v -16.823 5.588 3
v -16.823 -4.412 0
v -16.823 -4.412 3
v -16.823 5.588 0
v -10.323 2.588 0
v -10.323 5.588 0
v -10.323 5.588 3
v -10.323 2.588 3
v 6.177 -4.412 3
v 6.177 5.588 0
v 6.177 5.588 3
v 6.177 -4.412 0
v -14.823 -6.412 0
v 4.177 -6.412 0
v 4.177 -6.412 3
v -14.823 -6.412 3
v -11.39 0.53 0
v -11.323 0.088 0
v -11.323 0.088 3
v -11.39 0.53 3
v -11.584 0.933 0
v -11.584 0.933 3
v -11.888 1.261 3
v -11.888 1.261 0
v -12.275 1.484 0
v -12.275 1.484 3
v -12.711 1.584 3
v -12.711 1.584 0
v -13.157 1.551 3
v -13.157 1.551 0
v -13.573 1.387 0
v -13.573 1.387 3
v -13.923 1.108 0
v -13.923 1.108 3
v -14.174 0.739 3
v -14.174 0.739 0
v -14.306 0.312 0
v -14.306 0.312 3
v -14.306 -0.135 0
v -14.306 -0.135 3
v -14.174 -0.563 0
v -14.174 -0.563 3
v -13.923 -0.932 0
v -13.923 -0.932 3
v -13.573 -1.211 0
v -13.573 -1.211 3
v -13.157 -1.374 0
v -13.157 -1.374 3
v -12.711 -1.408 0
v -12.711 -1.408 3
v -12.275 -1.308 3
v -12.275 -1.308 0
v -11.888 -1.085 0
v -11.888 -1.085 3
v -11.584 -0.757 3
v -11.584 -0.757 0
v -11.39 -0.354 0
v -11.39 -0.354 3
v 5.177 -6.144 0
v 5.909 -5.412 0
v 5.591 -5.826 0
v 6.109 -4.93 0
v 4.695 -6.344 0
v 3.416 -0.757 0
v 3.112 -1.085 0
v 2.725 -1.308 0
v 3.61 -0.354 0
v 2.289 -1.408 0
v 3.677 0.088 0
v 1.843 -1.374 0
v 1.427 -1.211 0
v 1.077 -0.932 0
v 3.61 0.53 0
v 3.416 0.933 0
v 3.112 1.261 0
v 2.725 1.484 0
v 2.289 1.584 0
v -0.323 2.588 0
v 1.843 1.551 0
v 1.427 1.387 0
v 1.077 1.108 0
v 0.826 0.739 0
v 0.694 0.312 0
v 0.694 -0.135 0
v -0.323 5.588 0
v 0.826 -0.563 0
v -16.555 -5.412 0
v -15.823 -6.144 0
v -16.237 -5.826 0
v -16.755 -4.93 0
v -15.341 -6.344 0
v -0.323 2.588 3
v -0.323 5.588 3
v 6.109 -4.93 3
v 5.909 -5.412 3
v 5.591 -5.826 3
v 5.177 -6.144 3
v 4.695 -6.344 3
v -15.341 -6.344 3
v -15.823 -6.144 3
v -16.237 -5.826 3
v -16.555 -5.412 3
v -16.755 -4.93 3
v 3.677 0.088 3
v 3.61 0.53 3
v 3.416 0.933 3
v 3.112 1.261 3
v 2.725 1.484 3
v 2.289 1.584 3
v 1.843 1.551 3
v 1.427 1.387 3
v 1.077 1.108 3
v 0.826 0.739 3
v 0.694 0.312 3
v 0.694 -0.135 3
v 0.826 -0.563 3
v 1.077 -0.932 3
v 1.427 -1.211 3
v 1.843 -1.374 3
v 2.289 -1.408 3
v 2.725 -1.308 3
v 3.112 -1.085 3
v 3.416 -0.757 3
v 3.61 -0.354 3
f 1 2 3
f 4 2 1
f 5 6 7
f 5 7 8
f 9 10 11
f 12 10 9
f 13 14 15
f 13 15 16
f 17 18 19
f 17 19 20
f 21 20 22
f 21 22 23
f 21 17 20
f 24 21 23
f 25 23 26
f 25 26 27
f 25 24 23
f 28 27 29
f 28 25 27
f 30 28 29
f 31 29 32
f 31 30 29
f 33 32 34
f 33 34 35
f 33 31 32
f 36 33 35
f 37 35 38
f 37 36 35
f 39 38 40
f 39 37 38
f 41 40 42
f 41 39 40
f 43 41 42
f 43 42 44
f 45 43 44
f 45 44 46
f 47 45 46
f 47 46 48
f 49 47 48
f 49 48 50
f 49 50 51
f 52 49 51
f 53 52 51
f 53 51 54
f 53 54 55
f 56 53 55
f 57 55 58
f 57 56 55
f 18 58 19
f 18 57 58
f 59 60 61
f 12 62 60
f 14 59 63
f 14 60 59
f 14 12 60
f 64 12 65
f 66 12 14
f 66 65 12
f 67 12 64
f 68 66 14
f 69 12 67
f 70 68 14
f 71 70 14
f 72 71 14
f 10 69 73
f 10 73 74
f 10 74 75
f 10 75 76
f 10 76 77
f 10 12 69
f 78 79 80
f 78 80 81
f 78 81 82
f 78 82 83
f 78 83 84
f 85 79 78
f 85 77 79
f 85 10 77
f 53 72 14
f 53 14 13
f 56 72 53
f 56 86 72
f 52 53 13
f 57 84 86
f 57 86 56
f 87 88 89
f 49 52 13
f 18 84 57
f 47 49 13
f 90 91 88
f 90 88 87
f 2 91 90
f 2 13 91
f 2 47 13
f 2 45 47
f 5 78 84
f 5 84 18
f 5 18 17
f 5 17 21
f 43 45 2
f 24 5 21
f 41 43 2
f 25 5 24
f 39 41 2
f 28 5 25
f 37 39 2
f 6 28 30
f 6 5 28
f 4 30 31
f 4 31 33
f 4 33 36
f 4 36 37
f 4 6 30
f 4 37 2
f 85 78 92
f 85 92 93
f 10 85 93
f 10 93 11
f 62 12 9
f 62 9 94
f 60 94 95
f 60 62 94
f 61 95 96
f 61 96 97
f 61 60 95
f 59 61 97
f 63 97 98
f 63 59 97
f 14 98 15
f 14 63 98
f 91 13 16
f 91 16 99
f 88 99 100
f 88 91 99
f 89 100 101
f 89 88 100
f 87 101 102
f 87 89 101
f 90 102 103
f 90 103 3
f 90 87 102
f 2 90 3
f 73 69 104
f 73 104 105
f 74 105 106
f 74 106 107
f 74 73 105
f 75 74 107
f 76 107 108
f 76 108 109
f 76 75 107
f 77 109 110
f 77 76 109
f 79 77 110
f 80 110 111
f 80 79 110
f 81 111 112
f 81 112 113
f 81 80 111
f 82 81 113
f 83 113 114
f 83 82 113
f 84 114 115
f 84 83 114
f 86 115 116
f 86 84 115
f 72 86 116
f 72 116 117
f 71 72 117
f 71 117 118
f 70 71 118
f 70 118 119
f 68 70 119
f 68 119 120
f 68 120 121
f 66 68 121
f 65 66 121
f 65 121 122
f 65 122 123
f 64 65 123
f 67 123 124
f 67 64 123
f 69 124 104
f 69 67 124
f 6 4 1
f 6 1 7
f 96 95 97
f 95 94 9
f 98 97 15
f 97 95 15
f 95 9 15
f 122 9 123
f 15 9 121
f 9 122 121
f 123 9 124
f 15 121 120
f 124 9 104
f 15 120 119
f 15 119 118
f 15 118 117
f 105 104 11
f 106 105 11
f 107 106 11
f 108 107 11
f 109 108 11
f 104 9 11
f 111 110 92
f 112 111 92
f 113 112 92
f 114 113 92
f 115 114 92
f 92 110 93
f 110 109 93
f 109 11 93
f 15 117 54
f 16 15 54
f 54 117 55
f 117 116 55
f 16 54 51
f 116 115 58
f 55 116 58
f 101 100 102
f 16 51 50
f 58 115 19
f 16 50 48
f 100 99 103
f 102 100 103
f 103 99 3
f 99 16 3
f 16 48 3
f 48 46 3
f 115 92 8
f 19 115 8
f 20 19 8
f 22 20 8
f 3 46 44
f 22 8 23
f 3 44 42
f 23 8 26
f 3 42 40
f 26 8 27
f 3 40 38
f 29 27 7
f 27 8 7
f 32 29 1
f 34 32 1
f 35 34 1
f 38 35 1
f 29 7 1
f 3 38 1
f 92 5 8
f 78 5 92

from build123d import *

# Parameters (mm, degrees)
SKETCH1_R           = 1.5
BOSS_EXTRUDE1_DEPTH = 3


with BuildPart() as part:
    # Sketch1 → Boss-Extrude1 (new body)
    with BuildSketch(Plane.XY):
        with BuildLine():
            Line((-10.322941477, 5.588109805), (-10.322941477, 2.588109805))
            Line((-10.322941477, 2.588109805), (-0.322941477, 2.588109805))
            Line((-0.322941477, 2.588109805), (-0.322941477, 5.588109805))
            Line((-0.322941477, 5.588109805), (6.177058523, 5.588109805))
            Line((6.177058523, 5.588109805), (6.177058523, -4.411890195))
            ThreePointArc((6.177058523, -4.411890195), (5.591272086, -5.826103757), (4.177058523, -6.411890195))
            Line((4.177058523, -6.411890195), (-14.822941477, -6.411890195))
            ThreePointArc((-14.822941477, -6.411890195), (-16.237155039, -5.826103757), (-16.822941477, -4.411890195))
            Line((-16.822941477, -4.411890195), (-16.822941477, 5.588109805))
            Line((-16.822941477, 5.588109805), (-10.322941477, 5.588109805))
        make_face()
        with Locations((-12.822941477, 0.088109805)):
            Circle(SKETCH1_R, mode=Mode.SUBTRACT)
        with Locations((2.177058523, 0.088109805)):
            Circle(SKETCH1_R, mode=Mode.SUBTRACT)
    extrude(amount=BOSS_EXTRUDE1_DEPTH)


solid = part.part
